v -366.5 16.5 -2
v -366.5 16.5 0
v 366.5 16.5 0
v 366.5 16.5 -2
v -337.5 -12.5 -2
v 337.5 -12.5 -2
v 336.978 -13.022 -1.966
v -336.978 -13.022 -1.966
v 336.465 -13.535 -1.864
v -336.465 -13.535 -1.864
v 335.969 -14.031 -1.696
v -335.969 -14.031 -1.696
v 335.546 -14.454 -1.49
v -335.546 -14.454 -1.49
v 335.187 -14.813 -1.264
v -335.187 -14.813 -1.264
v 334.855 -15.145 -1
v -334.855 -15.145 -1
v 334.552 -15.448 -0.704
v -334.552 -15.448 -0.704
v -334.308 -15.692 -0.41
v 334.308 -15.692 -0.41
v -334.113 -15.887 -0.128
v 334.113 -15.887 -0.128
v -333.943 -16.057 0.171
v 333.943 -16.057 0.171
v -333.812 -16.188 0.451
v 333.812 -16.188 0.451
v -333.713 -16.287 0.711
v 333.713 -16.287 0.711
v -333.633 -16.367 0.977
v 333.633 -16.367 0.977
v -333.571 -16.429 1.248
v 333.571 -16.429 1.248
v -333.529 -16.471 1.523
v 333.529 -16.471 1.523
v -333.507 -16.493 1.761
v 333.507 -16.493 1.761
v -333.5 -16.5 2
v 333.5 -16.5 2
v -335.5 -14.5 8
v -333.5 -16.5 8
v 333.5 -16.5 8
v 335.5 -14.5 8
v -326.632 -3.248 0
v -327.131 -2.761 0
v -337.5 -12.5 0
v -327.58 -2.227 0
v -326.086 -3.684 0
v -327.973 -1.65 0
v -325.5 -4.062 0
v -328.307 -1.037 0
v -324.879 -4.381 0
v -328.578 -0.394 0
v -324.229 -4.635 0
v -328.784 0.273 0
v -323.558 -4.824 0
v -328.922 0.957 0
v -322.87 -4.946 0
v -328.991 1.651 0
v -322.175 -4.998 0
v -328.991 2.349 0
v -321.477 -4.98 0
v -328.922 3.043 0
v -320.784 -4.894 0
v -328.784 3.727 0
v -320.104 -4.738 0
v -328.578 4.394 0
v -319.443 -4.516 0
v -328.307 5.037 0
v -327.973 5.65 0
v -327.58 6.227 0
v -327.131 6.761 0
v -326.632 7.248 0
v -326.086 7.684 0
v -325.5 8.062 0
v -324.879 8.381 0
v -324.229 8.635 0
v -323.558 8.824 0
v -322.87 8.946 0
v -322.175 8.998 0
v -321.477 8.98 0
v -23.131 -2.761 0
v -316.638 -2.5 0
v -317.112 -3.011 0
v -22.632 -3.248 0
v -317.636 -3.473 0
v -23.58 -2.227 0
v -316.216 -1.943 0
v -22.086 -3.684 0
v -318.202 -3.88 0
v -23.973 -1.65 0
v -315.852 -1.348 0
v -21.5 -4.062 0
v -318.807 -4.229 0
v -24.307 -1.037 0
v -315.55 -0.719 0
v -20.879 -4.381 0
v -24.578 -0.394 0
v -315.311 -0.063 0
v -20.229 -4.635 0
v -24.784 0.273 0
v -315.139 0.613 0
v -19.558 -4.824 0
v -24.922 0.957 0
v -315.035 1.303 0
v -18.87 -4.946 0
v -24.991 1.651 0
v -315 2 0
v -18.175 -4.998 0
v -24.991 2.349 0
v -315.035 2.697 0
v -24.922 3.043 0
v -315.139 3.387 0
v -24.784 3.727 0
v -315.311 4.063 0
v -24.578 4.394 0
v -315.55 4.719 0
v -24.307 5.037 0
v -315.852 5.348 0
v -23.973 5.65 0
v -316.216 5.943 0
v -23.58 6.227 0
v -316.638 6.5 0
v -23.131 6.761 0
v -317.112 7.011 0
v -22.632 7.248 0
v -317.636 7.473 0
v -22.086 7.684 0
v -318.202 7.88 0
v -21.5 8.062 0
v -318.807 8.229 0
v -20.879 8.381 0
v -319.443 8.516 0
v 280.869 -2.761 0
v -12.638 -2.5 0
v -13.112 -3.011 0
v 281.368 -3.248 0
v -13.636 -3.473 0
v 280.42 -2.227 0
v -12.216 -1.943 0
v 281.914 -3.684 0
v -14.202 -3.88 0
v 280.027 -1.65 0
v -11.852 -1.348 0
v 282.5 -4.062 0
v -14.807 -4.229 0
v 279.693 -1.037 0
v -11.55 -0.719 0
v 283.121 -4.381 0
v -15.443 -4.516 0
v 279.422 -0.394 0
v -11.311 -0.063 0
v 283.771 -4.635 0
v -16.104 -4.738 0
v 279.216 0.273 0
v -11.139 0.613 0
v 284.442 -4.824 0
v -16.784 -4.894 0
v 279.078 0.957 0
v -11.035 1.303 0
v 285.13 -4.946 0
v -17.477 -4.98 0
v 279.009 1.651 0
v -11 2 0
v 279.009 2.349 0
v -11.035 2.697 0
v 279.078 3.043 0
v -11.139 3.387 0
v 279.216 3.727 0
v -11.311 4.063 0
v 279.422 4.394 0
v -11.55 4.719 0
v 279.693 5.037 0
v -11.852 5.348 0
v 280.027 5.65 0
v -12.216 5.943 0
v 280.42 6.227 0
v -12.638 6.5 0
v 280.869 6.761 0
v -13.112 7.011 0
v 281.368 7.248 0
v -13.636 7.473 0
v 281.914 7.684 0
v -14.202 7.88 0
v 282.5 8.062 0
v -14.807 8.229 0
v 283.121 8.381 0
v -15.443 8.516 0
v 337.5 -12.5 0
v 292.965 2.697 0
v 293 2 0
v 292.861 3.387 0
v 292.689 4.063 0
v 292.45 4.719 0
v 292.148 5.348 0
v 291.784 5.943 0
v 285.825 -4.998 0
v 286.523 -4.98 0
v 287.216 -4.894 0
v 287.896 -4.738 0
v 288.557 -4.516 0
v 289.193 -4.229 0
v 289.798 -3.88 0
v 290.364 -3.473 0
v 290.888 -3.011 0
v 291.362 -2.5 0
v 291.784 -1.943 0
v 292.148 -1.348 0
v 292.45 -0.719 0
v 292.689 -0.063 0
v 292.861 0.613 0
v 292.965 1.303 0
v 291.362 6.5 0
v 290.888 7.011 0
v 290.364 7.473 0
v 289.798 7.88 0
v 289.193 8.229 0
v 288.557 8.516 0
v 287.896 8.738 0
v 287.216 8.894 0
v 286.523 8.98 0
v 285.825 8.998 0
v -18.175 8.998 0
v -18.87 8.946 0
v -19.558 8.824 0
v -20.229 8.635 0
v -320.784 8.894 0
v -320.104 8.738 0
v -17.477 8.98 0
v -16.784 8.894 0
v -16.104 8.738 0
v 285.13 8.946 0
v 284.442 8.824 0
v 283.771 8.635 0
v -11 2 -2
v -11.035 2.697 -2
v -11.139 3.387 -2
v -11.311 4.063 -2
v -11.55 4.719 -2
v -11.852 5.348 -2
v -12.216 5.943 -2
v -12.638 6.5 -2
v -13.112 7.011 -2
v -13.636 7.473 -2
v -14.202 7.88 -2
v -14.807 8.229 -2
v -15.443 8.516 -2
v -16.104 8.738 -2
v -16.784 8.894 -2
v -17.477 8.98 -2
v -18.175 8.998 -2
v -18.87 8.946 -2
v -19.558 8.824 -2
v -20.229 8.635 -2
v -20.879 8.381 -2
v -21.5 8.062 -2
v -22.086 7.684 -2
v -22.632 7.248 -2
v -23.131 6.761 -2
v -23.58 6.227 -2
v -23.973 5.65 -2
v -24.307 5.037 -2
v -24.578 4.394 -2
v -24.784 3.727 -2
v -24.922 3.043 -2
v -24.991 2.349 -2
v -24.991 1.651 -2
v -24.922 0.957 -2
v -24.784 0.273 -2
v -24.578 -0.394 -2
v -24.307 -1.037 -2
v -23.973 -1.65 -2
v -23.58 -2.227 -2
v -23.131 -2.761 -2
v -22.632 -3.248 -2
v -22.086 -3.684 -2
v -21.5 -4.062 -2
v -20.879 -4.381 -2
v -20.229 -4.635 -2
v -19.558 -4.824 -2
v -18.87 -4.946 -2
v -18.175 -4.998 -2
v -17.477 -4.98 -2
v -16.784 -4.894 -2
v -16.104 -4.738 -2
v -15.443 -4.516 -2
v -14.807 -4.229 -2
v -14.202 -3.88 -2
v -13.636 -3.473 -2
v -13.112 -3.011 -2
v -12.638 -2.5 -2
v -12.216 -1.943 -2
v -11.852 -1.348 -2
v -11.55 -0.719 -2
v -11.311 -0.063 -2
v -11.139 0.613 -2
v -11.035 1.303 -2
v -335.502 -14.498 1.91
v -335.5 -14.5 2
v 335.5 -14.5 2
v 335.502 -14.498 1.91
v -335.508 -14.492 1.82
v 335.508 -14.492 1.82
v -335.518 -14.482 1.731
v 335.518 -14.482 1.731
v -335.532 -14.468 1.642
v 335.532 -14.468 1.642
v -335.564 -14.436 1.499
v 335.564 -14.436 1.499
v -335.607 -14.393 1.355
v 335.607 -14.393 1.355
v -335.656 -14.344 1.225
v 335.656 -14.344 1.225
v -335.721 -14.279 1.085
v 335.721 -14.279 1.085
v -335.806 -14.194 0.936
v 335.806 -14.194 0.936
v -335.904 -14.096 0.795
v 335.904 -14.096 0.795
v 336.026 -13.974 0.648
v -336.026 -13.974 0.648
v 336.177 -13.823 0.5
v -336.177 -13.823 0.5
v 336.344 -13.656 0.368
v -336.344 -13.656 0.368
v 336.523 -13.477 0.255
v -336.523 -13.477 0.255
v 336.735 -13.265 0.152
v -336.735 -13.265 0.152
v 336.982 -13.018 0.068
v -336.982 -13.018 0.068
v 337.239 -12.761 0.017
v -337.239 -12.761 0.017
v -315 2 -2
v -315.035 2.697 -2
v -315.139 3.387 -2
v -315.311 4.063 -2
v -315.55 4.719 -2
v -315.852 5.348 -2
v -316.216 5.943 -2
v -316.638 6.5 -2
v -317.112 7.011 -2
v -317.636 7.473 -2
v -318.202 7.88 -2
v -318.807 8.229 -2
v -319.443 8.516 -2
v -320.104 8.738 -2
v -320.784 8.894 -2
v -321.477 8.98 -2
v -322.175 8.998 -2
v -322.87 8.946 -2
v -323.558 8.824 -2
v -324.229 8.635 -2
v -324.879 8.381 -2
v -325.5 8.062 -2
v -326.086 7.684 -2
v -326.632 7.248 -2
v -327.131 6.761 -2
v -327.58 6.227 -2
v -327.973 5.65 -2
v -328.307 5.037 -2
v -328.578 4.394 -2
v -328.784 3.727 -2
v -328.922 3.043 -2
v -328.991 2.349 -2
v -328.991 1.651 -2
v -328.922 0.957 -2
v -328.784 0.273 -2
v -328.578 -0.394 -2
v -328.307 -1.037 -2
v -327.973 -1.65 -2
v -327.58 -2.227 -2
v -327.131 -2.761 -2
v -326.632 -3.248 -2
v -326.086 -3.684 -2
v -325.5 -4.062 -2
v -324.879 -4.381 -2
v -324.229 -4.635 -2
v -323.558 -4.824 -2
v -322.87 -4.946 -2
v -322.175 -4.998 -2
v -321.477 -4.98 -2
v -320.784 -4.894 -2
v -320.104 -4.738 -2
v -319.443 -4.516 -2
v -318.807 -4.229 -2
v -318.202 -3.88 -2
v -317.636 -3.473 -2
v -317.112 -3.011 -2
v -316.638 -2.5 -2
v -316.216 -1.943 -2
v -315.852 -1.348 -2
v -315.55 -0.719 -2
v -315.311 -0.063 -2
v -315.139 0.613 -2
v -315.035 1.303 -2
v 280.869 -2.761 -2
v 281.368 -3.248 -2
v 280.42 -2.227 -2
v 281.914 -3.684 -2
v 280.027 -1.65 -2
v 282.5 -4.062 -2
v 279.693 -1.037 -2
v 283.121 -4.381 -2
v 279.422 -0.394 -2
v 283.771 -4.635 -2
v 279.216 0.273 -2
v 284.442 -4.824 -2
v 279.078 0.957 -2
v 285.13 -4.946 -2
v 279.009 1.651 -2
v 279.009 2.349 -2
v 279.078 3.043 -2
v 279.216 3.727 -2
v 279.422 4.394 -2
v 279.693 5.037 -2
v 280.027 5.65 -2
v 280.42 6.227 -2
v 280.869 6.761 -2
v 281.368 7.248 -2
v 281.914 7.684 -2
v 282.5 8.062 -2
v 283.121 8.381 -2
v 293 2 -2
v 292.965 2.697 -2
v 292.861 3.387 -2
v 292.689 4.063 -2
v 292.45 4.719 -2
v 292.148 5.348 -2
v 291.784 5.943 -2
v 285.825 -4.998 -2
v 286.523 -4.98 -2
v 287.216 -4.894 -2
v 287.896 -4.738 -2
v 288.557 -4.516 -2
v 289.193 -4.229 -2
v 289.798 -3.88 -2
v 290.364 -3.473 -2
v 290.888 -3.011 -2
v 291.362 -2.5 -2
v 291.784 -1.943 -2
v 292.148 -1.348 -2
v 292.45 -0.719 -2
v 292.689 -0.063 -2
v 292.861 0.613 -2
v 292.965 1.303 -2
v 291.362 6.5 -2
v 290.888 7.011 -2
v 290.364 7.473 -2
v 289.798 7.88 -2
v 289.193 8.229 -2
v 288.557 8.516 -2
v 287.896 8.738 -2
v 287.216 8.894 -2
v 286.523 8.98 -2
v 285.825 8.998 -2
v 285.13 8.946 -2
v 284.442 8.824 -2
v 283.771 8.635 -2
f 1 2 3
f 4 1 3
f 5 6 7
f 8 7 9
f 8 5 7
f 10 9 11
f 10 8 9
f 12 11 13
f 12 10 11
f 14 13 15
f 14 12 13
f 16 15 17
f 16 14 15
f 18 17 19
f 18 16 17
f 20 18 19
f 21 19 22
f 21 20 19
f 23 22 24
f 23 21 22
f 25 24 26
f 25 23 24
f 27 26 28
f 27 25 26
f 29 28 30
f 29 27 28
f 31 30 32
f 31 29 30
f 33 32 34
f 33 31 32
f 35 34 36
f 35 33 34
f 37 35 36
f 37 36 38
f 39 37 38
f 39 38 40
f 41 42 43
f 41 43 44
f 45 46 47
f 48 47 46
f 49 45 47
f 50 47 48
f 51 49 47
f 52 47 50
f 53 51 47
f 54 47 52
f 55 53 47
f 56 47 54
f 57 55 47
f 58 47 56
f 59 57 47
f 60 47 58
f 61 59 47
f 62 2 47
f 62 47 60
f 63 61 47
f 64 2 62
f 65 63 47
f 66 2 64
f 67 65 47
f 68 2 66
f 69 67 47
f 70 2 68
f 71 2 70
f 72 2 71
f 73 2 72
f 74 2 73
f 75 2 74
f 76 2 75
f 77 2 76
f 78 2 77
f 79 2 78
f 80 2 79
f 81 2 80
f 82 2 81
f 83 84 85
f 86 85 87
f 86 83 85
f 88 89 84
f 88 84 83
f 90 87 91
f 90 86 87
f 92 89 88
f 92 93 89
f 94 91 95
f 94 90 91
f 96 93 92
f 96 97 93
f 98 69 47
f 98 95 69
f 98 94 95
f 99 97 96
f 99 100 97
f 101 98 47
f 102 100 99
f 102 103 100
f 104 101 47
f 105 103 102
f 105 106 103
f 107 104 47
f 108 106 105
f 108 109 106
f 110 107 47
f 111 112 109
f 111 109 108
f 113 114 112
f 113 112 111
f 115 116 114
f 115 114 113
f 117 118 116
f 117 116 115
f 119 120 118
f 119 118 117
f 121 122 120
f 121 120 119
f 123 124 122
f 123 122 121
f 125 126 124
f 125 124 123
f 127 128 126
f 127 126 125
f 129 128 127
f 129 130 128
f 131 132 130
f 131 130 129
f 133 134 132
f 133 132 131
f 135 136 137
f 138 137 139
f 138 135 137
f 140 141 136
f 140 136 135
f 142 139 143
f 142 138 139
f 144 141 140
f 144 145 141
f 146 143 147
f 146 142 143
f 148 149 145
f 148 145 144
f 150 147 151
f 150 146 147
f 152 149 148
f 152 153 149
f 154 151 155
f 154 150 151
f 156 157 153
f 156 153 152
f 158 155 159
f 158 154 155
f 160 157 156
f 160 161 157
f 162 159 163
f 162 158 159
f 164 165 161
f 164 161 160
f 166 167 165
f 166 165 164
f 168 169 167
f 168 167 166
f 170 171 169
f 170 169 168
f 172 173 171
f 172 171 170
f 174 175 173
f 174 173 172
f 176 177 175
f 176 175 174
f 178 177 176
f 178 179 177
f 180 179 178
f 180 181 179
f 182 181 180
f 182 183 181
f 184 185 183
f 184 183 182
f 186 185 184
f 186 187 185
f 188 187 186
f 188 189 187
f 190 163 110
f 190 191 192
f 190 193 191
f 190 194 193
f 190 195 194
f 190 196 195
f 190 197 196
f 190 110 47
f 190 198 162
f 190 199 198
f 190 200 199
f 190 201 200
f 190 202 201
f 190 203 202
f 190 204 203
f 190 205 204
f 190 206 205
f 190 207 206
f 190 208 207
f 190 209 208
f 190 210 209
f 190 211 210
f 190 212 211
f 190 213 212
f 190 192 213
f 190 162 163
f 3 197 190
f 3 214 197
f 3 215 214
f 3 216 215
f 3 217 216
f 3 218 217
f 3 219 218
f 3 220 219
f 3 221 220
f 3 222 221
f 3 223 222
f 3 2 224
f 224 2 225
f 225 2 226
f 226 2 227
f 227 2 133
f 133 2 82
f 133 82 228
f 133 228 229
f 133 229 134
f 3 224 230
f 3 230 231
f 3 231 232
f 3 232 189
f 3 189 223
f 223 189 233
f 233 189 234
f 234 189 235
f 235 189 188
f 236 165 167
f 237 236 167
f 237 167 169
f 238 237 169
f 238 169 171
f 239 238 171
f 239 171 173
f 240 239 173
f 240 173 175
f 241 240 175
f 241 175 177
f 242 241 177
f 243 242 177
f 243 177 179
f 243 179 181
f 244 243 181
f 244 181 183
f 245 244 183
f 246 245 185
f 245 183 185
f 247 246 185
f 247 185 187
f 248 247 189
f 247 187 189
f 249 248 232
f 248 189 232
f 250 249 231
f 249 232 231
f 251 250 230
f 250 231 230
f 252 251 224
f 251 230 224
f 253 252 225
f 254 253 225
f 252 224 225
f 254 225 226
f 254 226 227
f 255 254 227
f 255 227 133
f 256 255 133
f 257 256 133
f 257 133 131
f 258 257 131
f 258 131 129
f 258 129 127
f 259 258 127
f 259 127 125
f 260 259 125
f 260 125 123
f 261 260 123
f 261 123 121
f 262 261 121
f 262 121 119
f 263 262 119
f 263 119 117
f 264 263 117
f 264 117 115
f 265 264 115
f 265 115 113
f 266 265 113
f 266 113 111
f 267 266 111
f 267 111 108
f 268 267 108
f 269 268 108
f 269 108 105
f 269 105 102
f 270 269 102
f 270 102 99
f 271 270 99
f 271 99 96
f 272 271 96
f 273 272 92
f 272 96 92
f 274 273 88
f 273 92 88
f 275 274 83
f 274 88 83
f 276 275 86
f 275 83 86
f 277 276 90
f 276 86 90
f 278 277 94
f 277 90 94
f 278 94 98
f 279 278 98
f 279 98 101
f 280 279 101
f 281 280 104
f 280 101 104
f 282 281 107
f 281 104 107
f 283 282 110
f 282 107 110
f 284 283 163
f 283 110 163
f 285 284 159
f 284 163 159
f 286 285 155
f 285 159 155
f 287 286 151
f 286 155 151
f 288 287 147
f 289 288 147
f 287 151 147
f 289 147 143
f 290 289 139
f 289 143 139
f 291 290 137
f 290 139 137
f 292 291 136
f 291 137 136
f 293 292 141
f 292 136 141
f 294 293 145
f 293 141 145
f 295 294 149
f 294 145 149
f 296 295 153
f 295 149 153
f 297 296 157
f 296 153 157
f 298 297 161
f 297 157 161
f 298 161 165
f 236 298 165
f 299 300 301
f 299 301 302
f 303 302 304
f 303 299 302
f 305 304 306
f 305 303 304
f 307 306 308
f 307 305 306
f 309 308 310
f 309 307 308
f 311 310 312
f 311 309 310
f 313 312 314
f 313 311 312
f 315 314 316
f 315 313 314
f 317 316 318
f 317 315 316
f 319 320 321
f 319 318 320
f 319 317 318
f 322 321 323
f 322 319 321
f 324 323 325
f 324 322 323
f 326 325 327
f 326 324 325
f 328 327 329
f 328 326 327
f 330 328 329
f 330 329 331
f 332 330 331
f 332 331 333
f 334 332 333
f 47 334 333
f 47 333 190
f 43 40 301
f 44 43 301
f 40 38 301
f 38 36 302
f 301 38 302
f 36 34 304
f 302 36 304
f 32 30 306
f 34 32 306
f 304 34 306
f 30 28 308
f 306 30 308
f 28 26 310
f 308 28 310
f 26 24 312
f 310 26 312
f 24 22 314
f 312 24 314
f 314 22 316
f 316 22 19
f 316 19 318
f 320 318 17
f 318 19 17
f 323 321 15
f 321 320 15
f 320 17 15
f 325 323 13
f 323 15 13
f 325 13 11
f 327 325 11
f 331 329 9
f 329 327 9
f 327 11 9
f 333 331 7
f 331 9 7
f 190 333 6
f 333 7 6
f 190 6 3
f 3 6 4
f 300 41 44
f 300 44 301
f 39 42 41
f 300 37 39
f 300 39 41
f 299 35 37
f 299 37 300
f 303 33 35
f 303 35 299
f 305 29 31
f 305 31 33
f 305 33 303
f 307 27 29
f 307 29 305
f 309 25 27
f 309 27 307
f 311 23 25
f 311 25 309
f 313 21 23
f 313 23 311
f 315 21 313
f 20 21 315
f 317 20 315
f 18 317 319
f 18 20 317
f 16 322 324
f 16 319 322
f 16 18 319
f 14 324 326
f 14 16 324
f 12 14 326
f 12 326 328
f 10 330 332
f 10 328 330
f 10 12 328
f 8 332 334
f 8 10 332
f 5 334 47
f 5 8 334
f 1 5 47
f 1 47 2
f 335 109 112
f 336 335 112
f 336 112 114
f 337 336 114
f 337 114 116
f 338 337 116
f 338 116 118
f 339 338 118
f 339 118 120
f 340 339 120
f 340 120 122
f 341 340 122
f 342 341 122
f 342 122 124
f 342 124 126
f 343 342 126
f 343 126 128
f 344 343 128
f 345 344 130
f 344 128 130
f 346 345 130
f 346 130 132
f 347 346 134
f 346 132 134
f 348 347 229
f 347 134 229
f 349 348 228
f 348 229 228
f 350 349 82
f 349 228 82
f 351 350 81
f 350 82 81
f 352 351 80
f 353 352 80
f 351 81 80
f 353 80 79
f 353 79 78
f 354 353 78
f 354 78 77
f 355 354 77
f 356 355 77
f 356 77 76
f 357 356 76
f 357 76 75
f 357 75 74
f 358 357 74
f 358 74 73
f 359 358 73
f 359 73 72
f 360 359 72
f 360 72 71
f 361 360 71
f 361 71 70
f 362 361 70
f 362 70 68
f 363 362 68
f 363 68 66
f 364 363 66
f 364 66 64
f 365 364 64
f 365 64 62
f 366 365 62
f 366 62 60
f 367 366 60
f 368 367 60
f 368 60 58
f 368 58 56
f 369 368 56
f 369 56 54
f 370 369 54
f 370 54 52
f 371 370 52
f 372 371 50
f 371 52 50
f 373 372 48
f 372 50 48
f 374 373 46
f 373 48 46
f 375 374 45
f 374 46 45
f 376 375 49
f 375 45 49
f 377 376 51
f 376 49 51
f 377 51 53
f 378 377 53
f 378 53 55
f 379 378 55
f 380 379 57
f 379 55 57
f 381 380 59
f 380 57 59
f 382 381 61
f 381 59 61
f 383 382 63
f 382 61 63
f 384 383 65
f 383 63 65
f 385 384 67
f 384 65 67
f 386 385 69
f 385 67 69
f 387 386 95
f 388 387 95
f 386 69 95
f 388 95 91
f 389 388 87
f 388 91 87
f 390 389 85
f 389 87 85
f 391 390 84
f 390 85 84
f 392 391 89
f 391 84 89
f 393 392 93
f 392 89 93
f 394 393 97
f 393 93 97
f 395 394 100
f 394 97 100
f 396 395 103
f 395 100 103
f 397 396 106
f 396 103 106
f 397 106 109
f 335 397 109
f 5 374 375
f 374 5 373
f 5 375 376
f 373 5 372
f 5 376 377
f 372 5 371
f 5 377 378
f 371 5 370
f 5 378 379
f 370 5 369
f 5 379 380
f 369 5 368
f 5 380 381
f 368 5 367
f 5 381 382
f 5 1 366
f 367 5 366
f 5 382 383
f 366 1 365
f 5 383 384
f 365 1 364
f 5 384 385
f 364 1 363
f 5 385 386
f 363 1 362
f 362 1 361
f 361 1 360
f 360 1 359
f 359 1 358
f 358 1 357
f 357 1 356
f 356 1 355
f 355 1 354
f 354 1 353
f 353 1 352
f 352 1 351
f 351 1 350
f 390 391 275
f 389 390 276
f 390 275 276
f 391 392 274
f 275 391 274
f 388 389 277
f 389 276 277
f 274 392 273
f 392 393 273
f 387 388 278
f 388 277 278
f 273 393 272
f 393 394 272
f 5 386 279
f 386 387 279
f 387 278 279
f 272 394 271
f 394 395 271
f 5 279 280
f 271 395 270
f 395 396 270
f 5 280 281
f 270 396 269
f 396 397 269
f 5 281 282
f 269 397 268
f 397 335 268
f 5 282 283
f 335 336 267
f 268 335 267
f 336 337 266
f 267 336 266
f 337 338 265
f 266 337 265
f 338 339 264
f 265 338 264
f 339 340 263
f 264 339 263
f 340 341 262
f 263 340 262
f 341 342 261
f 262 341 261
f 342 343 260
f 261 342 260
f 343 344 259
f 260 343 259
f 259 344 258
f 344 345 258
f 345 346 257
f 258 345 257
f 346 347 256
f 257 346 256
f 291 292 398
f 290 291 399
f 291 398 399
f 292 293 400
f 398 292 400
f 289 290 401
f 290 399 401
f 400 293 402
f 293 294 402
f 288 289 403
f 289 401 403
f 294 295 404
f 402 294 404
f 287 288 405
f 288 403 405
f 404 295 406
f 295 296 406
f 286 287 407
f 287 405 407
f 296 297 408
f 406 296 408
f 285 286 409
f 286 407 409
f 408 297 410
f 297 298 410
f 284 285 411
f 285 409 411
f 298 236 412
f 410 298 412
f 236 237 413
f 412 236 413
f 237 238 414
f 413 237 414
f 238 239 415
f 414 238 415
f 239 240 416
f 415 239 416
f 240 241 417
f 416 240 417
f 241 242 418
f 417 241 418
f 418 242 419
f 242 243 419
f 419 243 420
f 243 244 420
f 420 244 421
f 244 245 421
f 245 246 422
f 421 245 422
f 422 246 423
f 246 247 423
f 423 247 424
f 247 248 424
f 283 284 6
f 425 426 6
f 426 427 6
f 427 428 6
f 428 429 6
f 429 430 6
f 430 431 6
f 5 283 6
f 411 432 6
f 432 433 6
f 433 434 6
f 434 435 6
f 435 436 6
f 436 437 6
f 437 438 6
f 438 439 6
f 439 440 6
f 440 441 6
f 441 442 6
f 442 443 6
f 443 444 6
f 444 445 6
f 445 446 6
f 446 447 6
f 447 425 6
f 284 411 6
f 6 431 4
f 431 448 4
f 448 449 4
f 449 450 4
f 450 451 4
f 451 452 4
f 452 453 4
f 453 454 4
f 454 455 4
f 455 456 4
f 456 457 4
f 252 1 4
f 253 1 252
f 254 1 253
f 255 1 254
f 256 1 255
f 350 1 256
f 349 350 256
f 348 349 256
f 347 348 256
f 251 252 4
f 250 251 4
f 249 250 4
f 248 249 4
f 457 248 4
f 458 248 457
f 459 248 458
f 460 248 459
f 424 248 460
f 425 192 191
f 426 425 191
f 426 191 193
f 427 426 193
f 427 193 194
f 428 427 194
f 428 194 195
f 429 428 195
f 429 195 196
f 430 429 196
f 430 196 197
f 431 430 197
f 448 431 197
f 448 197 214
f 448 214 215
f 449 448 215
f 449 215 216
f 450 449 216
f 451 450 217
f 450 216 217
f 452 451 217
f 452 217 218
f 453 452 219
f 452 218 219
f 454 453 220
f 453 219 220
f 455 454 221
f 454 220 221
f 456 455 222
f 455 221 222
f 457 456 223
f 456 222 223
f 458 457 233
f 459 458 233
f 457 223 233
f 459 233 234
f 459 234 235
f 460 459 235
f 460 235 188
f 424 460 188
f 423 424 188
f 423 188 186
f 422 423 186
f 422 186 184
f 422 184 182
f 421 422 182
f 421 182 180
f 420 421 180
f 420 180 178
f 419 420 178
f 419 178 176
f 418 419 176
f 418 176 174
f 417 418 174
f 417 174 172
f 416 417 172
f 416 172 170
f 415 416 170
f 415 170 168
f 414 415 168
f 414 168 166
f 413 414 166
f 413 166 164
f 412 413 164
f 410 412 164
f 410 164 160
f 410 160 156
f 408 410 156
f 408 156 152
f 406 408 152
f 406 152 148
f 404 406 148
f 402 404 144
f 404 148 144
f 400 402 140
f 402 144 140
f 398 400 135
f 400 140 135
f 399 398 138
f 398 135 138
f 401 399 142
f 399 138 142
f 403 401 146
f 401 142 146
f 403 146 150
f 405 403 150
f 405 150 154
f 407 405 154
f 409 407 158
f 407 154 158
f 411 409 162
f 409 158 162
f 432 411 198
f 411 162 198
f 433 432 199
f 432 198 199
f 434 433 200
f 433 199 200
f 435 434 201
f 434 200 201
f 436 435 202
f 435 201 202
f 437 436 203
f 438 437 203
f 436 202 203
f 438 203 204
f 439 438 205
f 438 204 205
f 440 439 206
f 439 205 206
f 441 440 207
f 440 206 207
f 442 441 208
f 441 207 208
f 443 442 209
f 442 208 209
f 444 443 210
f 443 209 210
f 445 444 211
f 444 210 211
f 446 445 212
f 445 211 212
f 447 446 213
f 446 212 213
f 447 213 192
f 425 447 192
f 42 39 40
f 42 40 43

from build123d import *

# Parameters (mm, degrees)
SKETCH1_W                    = 1080
SKETCH1_H                    = 33
BASE_FLANGE1_DEPTH           = 2
EDGE_FLANGE1_STRIP_W         = 12
EDGE_FLANGE1_STRIP_H         = 2
EDGE_FLANGE1_STRIP_CUT_DEPTH = 1080
EDGE_FLANGE1_DEPTH           = 1080
SKETCH9_R                    = 7
CUT_EXTRUDE1_DEPTH           = 10
CUT_EXTRUDE2_DEPTH           = 40
CUT_EXTRUDE2_DEPTH_BACK      = 40


# Sheet-metal steps are written as plain solids
with BuildPart() as part:
    # Sketch1 → Base-Flange1 (new body)
    with BuildSketch(Plane.XY):
        Rectangle(SKETCH1_W, SKETCH1_H)
    extrude(amount=-BASE_FLANGE1_DEPTH)

    # Edge-Flange1 strip (across the edge) → Edge-Flange1 strip cut (cut)
    with BuildSketch(Plane(origin=(-540, -16.5, 0), x_dir=(0, 1, 0), z_dir=(1, 0, 0))):
        with Locations((-2, -1)):
            Rectangle(EDGE_FLANGE1_STRIP_W, EDGE_FLANGE1_STRIP_H)
    extrude(amount=EDGE_FLANGE1_STRIP_CUT_DEPTH, mode=Mode.SUBTRACT)

    # Edge-Flange1 section (across the edge) → Edge-Flange1 (add)
    with BuildSketch(Plane(origin=(-540, -16.5, 0), x_dir=(0, 1, 0), z_dir=(1, 0, 0))):
        with BuildLine():
            Line((0, 2), (0, 8))
            Line((0, 8), (2, 8))
            Line((2, 8), (2, 2))
            ThreePointArc((2, 2), (2.585786438, 0.585786438), (4, 0))
            Line((4, 0), (4, -2))
            ThreePointArc((4, -2), (1.171572875, -0.828427125), (0, 2))
        make_face()
    extrude(amount=EDGE_FLANGE1_DEPTH)

    # Sketch9 → Cut-Extrude1 (cut)
    with BuildSketch(Plane.XY):
        with Locations((-930, 2)):
            Circle(SKETCH9_R)
        with Locations((-626, 2)):
            Circle(SKETCH9_R)
        with Locations((-322, 2)):
            Circle(SKETCH9_R)
        with Locations((-18, 2)):
            Circle(SKETCH9_R)
        with Locations((286, 2)):
            Circle(SKETCH9_R)
        with Locations((590, 2)):
            Circle(SKETCH9_R)
        with Locations((894, 2)):
            Circle(SKETCH9_R)
    extrude(amount=-CUT_EXTRUDE1_DEPTH, mode=Mode.SUBTRACT)

    # Sketch10 → Cut-Extrude2 (cut, two sides: drawn at the far end of the back side and taken through both)
    with BuildSketch(Plane.XY.offset(-CUT_EXTRUDE2_DEPTH_BACK)):
        Polygon((-302.377446669, -47.622553331), (-401.622553331, 51.622553331), (-590.417878705, 51.622553331), (-583.65364731, -79.056750642), (-558.625991149, -79.056750642), align=None)
        Polygon((558.625991149, -79.056750642), (302.377446669, -47.622553331), (401.622553331, 51.622553331), (590.417878705, 51.622553331), (583.65364731, -79.056750642), align=None)
    extrude(amount=CUT_EXTRUDE2_DEPTH + CUT_EXTRUDE2_DEPTH_BACK, mode=Mode.SUBTRACT)


solid = part.part
